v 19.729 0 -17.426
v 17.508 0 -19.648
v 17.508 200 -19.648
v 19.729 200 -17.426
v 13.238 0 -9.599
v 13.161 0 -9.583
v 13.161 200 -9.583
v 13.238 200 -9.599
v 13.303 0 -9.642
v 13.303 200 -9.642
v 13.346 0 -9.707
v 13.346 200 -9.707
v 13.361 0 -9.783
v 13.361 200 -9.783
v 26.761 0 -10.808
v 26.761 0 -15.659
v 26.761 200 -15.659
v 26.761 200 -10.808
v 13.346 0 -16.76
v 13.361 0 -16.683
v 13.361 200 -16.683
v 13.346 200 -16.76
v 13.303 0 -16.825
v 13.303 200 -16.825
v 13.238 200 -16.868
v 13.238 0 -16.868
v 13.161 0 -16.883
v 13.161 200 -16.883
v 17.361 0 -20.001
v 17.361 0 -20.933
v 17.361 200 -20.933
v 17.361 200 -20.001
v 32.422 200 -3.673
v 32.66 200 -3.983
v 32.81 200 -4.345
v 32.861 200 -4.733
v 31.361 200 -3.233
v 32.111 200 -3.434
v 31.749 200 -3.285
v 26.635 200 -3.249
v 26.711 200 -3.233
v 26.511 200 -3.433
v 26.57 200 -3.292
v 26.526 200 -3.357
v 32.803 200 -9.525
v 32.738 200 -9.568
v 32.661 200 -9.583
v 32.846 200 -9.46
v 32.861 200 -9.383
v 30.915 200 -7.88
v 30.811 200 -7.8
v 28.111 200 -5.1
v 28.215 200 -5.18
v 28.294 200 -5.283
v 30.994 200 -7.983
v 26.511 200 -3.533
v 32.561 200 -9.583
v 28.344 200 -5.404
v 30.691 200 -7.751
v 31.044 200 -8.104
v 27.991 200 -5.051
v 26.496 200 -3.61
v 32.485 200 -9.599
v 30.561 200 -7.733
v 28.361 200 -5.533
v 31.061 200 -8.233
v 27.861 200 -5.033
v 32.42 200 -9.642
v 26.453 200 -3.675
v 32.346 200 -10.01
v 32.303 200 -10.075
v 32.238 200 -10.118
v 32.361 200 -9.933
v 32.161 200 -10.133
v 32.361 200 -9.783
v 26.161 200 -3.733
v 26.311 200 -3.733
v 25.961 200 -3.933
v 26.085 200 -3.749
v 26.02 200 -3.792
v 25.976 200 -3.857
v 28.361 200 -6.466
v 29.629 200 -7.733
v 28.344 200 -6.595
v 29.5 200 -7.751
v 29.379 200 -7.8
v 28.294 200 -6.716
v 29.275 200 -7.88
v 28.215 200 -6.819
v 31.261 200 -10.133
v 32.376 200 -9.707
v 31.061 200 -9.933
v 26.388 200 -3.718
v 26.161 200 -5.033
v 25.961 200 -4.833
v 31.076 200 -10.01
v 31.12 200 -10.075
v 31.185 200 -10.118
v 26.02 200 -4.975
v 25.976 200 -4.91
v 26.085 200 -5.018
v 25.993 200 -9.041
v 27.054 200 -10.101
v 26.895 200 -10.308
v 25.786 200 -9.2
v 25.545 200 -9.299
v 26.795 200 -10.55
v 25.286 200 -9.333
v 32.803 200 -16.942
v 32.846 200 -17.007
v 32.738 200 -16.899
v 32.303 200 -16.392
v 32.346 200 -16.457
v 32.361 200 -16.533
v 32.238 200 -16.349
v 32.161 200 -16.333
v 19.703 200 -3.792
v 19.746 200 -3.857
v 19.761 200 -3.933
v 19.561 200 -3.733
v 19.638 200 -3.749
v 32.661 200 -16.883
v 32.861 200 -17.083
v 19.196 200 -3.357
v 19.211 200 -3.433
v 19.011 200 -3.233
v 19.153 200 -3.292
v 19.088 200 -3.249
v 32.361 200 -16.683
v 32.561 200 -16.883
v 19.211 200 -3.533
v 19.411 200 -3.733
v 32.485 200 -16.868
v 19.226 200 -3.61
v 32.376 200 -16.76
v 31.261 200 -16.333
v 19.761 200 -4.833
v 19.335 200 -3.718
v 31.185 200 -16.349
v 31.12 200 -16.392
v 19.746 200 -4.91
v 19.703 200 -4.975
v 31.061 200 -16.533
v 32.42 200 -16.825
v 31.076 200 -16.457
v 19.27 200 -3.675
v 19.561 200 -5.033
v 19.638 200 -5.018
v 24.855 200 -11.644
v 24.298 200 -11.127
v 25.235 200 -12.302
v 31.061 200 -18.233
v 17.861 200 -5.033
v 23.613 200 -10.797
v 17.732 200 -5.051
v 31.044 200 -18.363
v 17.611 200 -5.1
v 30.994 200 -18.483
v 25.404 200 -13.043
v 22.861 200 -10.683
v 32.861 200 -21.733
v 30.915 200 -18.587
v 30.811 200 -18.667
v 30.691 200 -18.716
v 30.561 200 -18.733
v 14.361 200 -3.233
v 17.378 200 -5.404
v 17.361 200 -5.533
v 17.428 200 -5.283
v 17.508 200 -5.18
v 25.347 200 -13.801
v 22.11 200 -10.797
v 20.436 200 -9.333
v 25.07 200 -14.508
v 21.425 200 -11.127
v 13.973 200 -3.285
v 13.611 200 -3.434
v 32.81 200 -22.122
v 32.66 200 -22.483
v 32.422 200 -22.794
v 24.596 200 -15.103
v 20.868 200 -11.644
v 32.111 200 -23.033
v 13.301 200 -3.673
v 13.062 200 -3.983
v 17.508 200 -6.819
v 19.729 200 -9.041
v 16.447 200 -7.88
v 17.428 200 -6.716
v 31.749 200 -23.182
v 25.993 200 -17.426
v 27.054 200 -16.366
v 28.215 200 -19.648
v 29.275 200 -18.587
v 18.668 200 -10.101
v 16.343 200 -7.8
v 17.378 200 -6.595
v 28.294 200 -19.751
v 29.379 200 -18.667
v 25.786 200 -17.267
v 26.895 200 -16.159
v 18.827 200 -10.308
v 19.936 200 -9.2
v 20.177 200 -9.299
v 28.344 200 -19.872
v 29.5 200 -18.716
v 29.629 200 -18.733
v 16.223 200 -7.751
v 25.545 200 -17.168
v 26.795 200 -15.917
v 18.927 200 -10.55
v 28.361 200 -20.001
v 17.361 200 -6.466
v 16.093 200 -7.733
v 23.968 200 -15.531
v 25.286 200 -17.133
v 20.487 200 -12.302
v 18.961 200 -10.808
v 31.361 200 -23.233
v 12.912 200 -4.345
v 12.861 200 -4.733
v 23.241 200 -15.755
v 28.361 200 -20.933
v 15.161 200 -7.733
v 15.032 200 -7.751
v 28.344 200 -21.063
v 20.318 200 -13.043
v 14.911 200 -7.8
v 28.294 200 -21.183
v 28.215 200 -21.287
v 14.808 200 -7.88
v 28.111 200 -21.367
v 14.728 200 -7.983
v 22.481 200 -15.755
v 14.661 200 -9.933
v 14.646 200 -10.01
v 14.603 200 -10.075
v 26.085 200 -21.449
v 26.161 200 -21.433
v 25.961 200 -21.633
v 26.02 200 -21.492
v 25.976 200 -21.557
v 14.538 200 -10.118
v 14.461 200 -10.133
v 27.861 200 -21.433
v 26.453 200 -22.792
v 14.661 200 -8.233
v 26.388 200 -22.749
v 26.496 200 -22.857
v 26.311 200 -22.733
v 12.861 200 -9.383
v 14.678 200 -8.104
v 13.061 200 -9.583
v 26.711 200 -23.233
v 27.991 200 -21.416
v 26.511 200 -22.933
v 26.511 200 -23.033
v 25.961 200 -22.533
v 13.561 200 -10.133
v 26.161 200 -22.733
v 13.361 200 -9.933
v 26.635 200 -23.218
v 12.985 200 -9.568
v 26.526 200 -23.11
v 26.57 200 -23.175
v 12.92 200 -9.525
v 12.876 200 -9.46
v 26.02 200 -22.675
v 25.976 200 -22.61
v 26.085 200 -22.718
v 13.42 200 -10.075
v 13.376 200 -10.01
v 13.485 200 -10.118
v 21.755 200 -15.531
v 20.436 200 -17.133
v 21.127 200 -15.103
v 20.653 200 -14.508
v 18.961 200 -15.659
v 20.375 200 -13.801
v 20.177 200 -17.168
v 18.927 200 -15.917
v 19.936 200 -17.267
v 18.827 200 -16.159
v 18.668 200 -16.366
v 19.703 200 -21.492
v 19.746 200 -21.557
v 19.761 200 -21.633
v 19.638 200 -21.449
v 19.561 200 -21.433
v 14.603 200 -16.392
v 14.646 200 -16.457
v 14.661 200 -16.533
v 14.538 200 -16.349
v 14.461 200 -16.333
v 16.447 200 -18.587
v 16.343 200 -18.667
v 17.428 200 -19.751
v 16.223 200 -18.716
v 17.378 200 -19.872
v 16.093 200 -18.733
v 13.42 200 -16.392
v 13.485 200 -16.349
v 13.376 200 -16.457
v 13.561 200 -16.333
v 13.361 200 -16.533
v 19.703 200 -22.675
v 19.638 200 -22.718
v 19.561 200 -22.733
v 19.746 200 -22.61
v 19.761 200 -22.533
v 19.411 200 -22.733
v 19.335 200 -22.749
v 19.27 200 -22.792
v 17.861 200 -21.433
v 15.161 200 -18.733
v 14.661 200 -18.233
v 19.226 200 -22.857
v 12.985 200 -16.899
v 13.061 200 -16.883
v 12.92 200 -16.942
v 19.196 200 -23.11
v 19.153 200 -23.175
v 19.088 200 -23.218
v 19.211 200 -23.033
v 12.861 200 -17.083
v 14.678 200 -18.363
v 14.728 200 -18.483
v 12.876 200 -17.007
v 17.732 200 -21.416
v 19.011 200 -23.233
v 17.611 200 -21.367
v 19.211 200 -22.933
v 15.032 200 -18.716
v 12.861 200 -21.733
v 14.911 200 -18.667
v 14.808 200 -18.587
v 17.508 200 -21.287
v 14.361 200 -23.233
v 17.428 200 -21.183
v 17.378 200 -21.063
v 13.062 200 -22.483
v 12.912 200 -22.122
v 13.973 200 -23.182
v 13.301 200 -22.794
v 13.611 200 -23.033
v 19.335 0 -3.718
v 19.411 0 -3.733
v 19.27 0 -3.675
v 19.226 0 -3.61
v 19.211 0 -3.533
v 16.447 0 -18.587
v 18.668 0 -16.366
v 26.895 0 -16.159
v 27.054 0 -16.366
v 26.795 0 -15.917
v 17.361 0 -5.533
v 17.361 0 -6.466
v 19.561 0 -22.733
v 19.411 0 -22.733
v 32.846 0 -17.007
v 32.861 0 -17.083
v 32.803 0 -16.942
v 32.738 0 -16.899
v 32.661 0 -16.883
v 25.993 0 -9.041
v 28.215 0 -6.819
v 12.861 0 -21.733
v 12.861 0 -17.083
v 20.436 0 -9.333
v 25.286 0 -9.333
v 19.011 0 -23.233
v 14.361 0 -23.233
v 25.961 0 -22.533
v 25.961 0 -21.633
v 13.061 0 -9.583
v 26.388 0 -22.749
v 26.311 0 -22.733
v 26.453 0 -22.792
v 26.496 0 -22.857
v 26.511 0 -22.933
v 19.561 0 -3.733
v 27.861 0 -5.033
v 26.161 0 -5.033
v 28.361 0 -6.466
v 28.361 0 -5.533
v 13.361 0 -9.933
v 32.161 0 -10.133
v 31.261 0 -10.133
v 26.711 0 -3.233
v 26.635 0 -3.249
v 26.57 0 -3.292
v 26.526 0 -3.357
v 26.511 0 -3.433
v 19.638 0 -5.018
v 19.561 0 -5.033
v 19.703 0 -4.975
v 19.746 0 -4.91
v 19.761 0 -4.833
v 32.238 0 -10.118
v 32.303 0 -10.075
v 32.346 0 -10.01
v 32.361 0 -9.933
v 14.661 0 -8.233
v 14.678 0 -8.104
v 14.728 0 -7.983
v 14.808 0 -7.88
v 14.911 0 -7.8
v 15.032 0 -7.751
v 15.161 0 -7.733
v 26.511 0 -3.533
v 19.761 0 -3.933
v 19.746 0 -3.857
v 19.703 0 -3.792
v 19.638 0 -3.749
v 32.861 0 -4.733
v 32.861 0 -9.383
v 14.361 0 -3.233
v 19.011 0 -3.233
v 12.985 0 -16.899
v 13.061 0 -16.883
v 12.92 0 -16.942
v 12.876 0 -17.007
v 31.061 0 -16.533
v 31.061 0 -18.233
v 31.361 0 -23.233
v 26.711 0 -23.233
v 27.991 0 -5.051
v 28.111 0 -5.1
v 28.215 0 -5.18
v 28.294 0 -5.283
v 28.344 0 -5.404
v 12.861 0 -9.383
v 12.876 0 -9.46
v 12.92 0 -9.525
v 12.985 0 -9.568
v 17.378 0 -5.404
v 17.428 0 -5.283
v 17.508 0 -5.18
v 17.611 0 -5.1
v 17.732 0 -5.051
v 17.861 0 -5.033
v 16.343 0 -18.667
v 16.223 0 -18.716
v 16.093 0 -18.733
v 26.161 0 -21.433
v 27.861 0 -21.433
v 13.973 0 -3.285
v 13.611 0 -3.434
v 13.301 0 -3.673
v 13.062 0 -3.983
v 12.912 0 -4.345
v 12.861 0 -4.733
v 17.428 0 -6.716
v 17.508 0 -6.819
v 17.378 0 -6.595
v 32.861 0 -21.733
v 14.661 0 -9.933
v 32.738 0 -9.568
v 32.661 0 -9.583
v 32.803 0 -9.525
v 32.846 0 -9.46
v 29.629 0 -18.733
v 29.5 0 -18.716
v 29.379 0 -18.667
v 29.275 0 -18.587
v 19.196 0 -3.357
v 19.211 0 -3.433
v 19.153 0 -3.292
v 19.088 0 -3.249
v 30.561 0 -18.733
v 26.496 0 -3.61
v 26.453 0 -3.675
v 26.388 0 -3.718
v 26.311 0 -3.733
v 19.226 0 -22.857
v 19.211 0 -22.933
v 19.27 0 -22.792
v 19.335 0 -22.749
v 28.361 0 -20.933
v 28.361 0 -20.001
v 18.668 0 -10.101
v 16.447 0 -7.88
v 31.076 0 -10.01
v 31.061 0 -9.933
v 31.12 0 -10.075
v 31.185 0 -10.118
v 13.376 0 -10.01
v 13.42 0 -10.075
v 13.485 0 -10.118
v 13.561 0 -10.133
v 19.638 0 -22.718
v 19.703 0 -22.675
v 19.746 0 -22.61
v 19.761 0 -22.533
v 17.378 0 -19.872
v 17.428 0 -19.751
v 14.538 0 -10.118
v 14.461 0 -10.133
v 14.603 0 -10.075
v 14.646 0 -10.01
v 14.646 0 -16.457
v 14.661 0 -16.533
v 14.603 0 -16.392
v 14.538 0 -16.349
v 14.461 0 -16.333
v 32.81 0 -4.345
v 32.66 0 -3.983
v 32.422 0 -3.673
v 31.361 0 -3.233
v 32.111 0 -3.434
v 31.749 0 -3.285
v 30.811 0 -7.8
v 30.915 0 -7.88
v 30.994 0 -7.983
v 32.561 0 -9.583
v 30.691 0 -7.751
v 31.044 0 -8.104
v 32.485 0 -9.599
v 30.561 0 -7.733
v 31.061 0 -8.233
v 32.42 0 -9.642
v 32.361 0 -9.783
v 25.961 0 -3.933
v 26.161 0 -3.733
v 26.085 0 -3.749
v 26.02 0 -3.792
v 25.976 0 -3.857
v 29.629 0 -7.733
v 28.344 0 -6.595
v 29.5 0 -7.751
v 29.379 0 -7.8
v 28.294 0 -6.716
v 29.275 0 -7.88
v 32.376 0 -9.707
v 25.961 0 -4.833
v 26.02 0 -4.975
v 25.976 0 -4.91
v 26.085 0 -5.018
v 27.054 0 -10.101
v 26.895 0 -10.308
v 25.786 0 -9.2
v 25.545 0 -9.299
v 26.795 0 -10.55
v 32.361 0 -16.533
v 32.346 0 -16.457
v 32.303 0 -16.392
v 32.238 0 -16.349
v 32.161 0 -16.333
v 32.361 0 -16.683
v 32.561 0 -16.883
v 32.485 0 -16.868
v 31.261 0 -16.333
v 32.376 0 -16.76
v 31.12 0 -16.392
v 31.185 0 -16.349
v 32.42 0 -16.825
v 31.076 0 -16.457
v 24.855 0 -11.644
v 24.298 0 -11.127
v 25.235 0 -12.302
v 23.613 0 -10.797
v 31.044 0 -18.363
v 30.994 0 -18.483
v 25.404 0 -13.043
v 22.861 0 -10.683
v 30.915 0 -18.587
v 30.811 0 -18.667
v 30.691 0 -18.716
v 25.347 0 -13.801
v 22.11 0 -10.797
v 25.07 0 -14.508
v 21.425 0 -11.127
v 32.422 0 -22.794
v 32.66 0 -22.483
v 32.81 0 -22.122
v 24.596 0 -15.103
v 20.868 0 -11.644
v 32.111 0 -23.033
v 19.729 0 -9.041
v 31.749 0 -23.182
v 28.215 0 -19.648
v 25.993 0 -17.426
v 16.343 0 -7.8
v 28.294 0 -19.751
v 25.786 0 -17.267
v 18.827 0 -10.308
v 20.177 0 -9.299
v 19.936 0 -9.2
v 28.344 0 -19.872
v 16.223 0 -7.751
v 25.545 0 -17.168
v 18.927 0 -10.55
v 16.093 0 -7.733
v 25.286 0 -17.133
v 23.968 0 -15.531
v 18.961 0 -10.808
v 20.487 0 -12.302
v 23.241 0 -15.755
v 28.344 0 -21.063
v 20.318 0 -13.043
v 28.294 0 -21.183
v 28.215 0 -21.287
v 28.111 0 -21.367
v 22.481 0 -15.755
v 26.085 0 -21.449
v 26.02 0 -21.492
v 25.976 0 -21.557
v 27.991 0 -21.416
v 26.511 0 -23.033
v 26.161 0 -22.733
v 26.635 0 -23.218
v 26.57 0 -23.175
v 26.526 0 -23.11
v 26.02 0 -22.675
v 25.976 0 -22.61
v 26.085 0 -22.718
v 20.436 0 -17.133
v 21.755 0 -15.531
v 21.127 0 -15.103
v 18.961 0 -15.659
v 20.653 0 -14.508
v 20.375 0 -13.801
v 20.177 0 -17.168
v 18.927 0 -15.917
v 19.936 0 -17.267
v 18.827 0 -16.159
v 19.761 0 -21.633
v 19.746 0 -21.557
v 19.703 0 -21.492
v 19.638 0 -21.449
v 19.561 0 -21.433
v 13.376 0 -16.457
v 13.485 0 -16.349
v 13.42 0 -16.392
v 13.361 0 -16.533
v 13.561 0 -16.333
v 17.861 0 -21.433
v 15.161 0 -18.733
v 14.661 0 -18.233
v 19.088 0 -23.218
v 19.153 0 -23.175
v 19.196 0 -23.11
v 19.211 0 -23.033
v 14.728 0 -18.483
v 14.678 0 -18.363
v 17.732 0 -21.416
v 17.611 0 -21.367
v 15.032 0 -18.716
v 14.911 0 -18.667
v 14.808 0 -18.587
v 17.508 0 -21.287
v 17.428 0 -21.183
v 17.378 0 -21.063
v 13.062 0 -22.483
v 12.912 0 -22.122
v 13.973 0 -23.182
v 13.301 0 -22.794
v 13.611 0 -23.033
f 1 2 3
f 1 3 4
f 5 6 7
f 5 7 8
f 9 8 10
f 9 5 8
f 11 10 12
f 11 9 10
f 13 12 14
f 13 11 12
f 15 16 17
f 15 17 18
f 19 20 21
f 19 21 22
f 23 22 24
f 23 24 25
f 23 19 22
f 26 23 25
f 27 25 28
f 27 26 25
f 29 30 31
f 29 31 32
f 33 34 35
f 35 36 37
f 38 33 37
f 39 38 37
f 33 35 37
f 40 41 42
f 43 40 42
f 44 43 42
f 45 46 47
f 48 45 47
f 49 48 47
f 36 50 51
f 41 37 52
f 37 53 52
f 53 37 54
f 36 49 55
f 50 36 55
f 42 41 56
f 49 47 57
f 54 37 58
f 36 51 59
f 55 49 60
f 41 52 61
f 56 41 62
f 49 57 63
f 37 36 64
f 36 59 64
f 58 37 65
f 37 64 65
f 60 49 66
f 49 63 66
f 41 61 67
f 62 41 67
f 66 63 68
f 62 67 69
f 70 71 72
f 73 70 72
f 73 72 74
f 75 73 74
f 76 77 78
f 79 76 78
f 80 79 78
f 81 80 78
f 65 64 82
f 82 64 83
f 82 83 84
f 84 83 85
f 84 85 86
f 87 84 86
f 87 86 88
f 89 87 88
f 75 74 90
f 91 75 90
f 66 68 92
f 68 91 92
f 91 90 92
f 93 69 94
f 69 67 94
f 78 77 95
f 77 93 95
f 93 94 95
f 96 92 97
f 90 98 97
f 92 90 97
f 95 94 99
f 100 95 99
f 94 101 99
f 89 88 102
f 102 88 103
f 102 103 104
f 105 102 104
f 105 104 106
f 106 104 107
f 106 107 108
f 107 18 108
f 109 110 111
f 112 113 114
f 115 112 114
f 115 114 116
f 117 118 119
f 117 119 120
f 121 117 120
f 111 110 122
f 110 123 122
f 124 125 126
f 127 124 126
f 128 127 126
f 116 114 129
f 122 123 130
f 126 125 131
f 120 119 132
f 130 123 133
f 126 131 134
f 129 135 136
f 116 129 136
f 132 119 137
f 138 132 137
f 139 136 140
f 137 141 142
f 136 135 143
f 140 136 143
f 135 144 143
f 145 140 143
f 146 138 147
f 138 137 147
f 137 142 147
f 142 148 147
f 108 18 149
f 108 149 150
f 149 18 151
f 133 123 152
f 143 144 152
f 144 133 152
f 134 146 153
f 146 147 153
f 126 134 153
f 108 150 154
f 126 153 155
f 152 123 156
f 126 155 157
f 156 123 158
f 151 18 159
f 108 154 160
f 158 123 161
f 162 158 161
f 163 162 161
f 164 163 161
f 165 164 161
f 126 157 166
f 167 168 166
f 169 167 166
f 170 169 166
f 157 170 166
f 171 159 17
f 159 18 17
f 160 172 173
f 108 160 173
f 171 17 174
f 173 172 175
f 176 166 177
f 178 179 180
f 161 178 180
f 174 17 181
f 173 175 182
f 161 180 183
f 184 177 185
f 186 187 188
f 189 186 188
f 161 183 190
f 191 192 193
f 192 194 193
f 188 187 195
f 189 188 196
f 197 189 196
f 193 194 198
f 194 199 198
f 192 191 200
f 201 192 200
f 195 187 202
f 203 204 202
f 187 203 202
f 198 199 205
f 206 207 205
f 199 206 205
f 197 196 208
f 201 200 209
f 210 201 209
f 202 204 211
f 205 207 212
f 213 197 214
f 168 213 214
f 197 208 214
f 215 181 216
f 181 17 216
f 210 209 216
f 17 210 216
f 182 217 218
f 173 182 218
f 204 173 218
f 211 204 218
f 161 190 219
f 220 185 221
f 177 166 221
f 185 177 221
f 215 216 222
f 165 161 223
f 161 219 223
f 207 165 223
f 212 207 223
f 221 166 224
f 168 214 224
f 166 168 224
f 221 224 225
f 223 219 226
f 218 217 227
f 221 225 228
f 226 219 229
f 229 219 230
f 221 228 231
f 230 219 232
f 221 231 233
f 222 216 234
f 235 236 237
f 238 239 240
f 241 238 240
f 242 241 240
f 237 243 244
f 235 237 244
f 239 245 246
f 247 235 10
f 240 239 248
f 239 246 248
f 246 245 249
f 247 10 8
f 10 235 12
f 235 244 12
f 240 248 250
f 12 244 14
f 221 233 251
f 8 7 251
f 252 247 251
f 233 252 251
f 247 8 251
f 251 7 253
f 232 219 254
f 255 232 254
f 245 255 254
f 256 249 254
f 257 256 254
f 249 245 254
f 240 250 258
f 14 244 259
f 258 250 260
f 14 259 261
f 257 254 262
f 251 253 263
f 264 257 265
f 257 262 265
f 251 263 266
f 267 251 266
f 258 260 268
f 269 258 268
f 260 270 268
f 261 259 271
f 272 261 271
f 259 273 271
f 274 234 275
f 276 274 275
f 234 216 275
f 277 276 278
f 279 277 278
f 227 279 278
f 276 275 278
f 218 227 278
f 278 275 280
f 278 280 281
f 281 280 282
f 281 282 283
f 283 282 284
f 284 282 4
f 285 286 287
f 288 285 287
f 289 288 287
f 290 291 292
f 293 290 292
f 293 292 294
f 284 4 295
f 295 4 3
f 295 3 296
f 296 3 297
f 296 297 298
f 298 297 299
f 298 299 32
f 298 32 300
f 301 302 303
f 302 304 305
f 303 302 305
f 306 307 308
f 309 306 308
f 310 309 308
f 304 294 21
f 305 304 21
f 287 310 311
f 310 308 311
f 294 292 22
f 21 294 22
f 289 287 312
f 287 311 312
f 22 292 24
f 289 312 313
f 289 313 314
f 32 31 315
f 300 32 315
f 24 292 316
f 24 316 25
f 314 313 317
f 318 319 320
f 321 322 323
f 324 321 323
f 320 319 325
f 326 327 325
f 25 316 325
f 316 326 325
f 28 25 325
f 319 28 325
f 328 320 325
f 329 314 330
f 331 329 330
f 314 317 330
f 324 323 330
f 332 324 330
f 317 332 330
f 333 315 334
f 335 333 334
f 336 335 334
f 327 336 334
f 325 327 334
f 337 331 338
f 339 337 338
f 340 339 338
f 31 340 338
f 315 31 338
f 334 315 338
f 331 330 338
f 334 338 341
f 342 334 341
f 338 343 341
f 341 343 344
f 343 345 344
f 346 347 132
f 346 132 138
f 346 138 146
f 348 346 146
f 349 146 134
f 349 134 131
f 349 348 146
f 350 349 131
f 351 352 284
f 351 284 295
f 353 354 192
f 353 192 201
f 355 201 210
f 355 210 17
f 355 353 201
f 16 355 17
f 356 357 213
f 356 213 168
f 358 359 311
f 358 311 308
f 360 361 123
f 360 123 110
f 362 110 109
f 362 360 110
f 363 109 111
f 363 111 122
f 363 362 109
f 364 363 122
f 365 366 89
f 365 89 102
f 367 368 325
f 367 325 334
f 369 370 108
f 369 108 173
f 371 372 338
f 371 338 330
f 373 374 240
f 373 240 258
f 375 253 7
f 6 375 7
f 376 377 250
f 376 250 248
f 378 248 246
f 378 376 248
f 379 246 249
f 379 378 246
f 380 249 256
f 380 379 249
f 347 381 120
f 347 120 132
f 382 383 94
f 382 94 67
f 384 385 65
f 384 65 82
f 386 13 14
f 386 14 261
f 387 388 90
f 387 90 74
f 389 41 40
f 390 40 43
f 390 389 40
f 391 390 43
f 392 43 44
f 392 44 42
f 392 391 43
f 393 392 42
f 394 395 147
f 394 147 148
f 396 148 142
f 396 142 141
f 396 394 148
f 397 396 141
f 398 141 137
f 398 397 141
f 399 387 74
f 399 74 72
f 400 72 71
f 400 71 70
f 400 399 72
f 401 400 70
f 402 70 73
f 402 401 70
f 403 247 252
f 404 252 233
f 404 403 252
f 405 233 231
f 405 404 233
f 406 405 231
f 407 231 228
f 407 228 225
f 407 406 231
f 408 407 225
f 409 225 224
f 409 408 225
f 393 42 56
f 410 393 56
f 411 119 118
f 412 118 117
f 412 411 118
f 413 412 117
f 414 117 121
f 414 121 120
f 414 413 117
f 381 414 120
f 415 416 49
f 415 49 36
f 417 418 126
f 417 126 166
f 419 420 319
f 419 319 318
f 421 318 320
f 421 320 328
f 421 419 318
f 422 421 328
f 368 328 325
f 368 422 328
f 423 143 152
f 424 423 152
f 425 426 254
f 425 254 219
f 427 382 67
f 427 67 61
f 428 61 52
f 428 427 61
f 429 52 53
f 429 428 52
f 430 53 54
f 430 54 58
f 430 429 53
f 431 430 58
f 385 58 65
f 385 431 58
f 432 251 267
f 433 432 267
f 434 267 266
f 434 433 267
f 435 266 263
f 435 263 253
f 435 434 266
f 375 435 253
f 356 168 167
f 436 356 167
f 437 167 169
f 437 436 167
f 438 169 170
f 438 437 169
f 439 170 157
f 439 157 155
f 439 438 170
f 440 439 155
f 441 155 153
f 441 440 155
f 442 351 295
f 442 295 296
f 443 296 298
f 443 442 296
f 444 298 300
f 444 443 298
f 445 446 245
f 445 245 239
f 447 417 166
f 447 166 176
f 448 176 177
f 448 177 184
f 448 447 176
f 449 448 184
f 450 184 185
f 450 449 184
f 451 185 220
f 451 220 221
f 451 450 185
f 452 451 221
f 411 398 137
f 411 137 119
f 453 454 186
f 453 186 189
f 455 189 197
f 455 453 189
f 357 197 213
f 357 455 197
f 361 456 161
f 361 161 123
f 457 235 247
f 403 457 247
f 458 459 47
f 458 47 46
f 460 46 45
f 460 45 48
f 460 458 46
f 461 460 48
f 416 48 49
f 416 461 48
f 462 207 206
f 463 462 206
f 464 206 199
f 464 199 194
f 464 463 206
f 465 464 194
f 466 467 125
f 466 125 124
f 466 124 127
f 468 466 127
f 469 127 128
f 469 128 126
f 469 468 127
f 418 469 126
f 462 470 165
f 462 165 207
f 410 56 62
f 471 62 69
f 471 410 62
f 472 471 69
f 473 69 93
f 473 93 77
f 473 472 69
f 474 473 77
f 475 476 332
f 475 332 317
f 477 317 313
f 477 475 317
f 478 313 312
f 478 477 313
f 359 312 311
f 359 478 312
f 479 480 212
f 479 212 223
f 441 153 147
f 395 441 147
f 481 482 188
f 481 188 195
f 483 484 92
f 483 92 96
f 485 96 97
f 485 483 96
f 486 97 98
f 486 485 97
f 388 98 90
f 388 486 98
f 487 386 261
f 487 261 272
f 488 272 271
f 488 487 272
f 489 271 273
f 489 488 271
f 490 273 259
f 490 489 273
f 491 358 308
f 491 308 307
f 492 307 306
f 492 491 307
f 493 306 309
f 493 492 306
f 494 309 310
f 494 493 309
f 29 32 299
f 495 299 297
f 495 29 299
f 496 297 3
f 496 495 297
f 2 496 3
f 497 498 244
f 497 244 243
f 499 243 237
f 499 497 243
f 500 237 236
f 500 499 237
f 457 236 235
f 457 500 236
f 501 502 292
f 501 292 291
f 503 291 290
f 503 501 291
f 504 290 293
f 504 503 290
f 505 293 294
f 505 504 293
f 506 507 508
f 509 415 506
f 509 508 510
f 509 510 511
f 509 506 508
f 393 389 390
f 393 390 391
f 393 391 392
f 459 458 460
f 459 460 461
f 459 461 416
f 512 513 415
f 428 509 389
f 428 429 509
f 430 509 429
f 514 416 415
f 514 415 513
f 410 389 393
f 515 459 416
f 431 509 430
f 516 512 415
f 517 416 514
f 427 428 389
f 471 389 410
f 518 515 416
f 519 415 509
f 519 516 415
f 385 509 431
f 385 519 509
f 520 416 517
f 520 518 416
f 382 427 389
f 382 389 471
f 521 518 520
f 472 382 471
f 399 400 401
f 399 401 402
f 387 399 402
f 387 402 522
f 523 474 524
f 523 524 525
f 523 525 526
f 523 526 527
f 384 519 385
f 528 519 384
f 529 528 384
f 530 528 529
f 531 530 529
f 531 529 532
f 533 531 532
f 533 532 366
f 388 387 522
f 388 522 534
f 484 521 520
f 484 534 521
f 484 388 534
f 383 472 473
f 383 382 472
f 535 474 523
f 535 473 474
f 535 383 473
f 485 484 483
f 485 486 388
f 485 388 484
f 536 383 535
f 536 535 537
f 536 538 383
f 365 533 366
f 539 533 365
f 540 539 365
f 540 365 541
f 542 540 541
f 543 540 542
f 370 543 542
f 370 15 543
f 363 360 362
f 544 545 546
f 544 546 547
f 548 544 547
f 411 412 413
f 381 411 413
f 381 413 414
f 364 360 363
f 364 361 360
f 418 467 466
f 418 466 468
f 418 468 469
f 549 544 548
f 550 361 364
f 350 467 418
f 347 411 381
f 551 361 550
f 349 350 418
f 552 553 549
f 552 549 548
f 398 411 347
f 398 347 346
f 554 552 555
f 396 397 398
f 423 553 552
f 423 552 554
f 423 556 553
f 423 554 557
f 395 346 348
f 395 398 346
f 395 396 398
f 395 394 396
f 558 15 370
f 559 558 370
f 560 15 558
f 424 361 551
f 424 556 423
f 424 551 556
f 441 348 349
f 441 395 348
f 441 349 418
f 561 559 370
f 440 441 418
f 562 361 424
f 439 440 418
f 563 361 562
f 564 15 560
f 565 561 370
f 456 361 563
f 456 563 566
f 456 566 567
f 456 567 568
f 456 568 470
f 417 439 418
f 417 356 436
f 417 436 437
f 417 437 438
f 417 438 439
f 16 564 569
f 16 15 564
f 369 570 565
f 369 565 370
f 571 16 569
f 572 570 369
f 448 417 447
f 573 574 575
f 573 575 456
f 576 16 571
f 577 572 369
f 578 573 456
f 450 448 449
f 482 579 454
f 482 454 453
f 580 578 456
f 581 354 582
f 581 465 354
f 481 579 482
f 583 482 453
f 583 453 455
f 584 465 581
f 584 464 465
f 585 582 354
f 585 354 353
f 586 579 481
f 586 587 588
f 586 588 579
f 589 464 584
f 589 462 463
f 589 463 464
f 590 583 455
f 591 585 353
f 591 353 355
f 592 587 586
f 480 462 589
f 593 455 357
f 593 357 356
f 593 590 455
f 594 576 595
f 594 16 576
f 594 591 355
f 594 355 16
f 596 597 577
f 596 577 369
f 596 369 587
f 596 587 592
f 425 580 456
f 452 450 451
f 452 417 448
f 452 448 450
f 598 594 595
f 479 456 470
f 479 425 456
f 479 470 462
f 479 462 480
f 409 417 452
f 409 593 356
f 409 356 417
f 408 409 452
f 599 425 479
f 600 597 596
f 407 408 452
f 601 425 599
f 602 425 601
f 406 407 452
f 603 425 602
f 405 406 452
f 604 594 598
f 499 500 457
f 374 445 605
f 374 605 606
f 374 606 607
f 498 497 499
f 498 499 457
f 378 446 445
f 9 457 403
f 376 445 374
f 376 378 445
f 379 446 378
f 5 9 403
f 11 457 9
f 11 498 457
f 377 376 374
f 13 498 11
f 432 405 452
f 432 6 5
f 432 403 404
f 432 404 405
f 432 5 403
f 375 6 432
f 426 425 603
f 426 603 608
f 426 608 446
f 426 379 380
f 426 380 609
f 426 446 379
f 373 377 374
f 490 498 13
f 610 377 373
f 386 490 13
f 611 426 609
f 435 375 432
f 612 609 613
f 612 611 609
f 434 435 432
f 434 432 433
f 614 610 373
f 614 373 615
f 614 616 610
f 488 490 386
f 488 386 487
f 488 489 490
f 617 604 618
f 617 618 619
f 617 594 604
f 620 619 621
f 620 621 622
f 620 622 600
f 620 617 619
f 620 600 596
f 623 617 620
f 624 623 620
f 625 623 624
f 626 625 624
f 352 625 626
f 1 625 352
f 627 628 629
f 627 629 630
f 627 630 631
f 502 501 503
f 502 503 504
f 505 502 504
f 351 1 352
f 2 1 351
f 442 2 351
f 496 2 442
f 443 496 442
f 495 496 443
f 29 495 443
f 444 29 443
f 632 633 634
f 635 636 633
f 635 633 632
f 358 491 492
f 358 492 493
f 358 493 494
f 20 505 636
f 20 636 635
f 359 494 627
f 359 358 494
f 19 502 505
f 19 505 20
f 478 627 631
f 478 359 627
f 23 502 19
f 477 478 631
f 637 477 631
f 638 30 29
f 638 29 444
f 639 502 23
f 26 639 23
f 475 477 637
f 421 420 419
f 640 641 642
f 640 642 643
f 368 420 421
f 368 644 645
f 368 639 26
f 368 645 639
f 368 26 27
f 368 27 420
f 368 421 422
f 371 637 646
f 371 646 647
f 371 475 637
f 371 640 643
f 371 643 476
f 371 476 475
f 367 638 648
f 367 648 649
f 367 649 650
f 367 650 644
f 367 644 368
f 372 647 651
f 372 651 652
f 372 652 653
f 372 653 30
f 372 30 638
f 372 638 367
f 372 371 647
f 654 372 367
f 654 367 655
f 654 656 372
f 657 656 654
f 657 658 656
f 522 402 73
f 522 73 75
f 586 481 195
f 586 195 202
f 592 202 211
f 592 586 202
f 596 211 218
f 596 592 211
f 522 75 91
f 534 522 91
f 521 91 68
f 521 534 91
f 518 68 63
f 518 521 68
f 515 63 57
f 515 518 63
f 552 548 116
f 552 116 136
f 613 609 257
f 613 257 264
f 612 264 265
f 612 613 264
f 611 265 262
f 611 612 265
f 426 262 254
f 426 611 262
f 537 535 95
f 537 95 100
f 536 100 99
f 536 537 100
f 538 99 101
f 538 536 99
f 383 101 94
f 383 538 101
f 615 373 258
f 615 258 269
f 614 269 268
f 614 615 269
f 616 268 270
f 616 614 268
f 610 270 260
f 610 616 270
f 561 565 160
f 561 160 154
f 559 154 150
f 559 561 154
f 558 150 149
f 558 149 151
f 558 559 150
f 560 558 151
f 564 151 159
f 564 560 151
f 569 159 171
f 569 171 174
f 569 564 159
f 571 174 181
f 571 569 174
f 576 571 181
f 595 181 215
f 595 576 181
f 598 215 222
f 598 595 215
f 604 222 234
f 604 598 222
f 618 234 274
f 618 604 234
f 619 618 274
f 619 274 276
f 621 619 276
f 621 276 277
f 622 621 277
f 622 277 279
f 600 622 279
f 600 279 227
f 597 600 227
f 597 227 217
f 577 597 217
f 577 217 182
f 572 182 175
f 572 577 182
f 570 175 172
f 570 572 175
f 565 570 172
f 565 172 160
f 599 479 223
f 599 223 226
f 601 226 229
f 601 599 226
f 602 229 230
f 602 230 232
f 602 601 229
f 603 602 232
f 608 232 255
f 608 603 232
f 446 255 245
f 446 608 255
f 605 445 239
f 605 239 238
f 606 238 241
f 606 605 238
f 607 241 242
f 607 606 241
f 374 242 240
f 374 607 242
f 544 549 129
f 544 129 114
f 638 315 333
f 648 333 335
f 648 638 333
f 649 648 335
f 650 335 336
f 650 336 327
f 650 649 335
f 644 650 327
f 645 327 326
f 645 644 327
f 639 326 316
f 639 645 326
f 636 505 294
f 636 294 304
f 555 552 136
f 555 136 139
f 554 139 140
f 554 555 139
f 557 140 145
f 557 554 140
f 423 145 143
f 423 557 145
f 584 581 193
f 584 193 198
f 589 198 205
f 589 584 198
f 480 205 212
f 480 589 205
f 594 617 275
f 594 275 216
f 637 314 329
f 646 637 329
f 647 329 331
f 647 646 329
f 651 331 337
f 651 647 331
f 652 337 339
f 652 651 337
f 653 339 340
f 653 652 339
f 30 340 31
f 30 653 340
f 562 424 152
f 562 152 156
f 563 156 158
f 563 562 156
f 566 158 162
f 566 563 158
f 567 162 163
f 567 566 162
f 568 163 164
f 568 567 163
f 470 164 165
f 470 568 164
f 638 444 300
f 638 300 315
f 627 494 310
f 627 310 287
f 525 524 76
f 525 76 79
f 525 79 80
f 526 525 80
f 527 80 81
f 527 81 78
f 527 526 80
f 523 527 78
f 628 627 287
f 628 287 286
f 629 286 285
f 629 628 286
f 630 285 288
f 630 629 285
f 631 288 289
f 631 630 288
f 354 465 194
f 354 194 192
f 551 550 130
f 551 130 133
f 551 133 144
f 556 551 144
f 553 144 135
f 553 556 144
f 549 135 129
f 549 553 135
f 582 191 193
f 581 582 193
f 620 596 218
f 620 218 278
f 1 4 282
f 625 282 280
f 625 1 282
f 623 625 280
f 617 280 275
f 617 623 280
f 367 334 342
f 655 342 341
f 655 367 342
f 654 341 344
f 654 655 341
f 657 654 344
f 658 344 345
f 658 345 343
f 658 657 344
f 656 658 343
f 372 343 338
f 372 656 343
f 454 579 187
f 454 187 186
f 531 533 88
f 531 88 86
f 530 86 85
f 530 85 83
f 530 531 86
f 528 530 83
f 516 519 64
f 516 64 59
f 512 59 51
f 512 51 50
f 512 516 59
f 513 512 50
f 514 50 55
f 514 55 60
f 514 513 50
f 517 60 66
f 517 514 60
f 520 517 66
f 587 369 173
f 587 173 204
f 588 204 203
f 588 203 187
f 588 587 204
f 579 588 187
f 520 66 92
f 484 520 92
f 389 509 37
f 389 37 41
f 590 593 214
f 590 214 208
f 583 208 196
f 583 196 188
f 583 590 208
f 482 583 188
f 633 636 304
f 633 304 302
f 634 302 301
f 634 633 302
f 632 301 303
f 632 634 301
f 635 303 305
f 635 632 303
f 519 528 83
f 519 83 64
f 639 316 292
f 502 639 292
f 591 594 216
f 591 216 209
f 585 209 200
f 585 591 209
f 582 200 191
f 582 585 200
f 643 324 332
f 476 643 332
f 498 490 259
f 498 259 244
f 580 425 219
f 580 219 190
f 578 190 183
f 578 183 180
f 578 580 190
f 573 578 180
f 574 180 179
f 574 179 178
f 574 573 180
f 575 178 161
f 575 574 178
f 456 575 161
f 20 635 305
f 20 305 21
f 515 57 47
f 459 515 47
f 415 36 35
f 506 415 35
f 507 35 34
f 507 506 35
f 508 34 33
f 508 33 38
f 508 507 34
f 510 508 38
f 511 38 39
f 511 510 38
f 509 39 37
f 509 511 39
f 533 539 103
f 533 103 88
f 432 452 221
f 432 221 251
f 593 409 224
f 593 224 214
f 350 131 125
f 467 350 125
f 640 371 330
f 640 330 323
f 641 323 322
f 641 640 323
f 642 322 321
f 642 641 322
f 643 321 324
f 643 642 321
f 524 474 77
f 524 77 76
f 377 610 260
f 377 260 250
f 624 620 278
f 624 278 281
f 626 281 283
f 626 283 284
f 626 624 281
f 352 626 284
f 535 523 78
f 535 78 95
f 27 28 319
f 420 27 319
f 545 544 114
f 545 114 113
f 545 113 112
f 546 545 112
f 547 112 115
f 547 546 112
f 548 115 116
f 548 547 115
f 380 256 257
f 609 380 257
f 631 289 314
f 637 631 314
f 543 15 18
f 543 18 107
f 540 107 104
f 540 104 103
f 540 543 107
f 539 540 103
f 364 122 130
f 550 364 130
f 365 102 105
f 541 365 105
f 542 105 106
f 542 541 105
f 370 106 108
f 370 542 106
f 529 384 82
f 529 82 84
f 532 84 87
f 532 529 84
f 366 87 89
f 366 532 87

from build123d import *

# Parameters (mm, degrees)
SKETCH_1_R      = 2.55
EXTRUDE_1_DEPTH = 200


with BuildPart() as part:
    # 草图1 → 凸台-拉伸1 (new body)
    with BuildSketch(Plane(origin=(0, 0, 0), x_dir=(1, 0, 0), z_dir=(0, 1, 0))):
        with BuildLine():
            Line((19.761209246, 22.533499136), (19.761209246, 21.633499136))
            ThreePointArc((19.761209246, 21.633499136), (19.702630602, 21.49207778), (19.561209246, 21.433499136))
            Line((19.561209246, 21.433499136), (17.861209246, 21.433499136))
            ThreePointArc((17.861209246, 21.433499136), (17.507655855, 21.287052526), (17.361209246, 20.933499136))
            Line((17.361209246, 20.933499136), (17.361209246, 20.001266089))
            ThreePointArc((17.361209246, 20.001266089), (17.39926948, 19.809924373), (17.507655855, 19.647712698))
            Line((17.507655855, 19.647712698), (19.728976199, 17.426392355))
            ThreePointArc((19.728976199, 17.426392355), (20.053399548, 17.209619603), (20.43608298, 17.133499136))
            Line((20.43608298, 17.133499136), (25.286335512, 17.133499136))
            ThreePointArc((25.286335512, 17.133499136), (25.669018944, 17.209619603), (25.993442293, 17.426392355))
            Line((25.993442293, 17.426392355), (28.214762636, 19.647712698))
            ThreePointArc((28.214762636, 19.647712698), (28.323149012, 19.809924373), (28.361209246, 20.001266089))
            Line((28.361209246, 20.001266089), (28.361209246, 20.933499136))
            ThreePointArc((28.361209246, 20.933499136), (28.214762636, 21.287052526), (27.861209246, 21.433499136))
            Line((27.861209246, 21.433499136), (26.161209246, 21.433499136))
            ThreePointArc((26.161209246, 21.433499136), (26.01978789, 21.49207778), (25.961209246, 21.633499136))
            Line((25.961209246, 21.633499136), (25.961209246, 22.533499136))
            ThreePointArc((25.961209246, 22.533499136), (26.01978789, 22.674920492), (26.161209246, 22.733499136))
            Line((26.161209246, 22.733499136), (26.311209246, 22.733499136))
            ThreePointArc((26.311209246, 22.733499136), (26.452630602, 22.79207778), (26.511209246, 22.933499136))
            Line((26.511209246, 22.933499136), (26.511209246, 23.033499136))
            ThreePointArc((26.511209246, 23.033499136), (26.56978789, 23.174920492), (26.711209246, 23.233499136))
            Line((26.711209246, 23.233499136), (31.361209246, 23.233499136))
            ThreePointArc((31.361209246, 23.233499136), (32.421869418, 22.794159308), (32.861209246, 21.733499136))
            Line((32.861209246, 21.733499136), (32.861209246, 17.083499136))
            ThreePointArc((32.861209246, 17.083499136), (32.802630602, 16.94207778), (32.661209246, 16.883499136))
            Line((32.661209246, 16.883499136), (32.561209246, 16.883499136))
            ThreePointArc((32.561209246, 16.883499136), (32.41978789, 16.824920492), (32.361209246, 16.683499136))
            Line((32.361209246, 16.683499136), (32.361209246, 16.533499136))
            ThreePointArc((32.361209246, 16.533499136), (32.302630602, 16.39207778), (32.161209246, 16.333499136))
            Line((32.161209246, 16.333499136), (31.261209246, 16.333499136))
            ThreePointArc((31.261209246, 16.333499136), (31.11978789, 16.39207778), (31.061209246, 16.533499136))
            Line((31.061209246, 16.533499136), (31.061209246, 18.233499136))
            ThreePointArc((31.061209246, 18.233499136), (30.914762636, 18.587052526), (30.561209246, 18.733499136))
            Line((30.561209246, 18.733499136), (29.628976199, 18.733499136))
            ThreePointArc((29.628976199, 18.733499136), (29.437634483, 18.695438902), (29.275422808, 18.587052526))
            Line((29.275422808, 18.587052526), (27.054102465, 16.365732183))
            ThreePointArc((27.054102465, 16.365732183), (26.837329713, 16.041308834), (26.761209246, 15.658625402))
            Line((26.761209246, 15.658625402), (26.761209246, 10.80837287))
            ThreePointArc((26.761209246, 10.80837287), (26.837329713, 10.425689438), (27.054102465, 10.101266089))
            Line((27.054102465, 10.101266089), (29.275422808, 7.879945745))
            ThreePointArc((29.275422808, 7.879945745), (29.437634483, 7.77155937), (29.628976199, 7.733499136))
            Line((29.628976199, 7.733499136), (30.561209246, 7.733499136))
            ThreePointArc((30.561209246, 7.733499136), (30.914762636, 7.879945745), (31.061209246, 8.233499136))
            Line((31.061209246, 8.233499136), (31.061209246, 9.933499136))
            ThreePointArc((31.061209246, 9.933499136), (31.11978789, 10.074920492), (31.261209246, 10.133499136))
            Line((31.261209246, 10.133499136), (32.161209246, 10.133499136))
            ThreePointArc((32.161209246, 10.133499136), (32.302630602, 10.074920492), (32.361209246, 9.933499136))
            Line((32.361209246, 9.933499136), (32.361209246, 9.783499136))
            ThreePointArc((32.361209246, 9.783499136), (32.41978789, 9.64207778), (32.561209246, 9.583499136))
            Line((32.561209246, 9.583499136), (32.661209246, 9.583499136))
            ThreePointArc((32.661209246, 9.583499136), (32.802630602, 9.524920492), (32.861209246, 9.383499136))
            Line((32.861209246, 9.383499136), (32.861209246, 4.733499136))
            ThreePointArc((32.861209246, 4.733499136), (32.421869418, 3.672838964), (31.361209246, 3.233499136))
            Line((31.361209246, 3.233499136), (26.711209246, 3.233499136))
            ThreePointArc((26.711209246, 3.233499136), (26.56978789, 3.29207778), (26.511209246, 3.433499136))
            Line((26.511209246, 3.433499136), (26.511209246, 3.533499136))
            ThreePointArc((26.511209246, 3.533499136), (26.452630602, 3.674920492), (26.311209246, 3.733499136))
            Line((26.311209246, 3.733499136), (26.161209246, 3.733499136))
            ThreePointArc((26.161209246, 3.733499136), (26.01978789, 3.79207778), (25.961209246, 3.933499136))
            Line((25.961209246, 3.933499136), (25.961209246, 4.833499136))
            ThreePointArc((25.961209246, 4.833499136), (26.01978789, 4.974920492), (26.161209246, 5.033499136))
            Line((26.161209246, 5.033499136), (27.861209246, 5.033499136))
            ThreePointArc((27.861209246, 5.033499136), (28.214762636, 5.179945745), (28.361209246, 5.533499136))
            Line((28.361209246, 5.533499136), (28.361209246, 6.465732183))
            ThreePointArc((28.361209246, 6.465732183), (28.323149012, 6.657073899), (28.214762636, 6.819285573))
            Line((28.214762636, 6.819285573), (25.993442293, 9.040605917))
            ThreePointArc((25.993442293, 9.040605917), (25.669018944, 9.257378668), (25.286335512, 9.333499136))
            Line((25.286335512, 9.333499136), (20.43608298, 9.333499136))
            ThreePointArc((20.43608298, 9.333499136), (20.053399548, 9.257378668), (19.728976199, 9.040605917))
            Line((19.728976199, 9.040605917), (17.507655855, 6.819285573))
            ThreePointArc((17.507655855, 6.819285573), (17.39926948, 6.657073899), (17.361209246, 6.465732183))
            Line((17.361209246, 6.465732183), (17.361209246, 5.533499136))
            ThreePointArc((17.361209246, 5.533499136), (17.507655855, 5.179945745), (17.861209246, 5.033499136))
            Line((17.861209246, 5.033499136), (19.561209246, 5.033499136))
            ThreePointArc((19.561209246, 5.033499136), (19.702630602, 4.974920492), (19.761209246, 4.833499136))
            Line((19.761209246, 4.833499136), (19.761209246, 3.933499136))
            ThreePointArc((19.761209246, 3.933499136), (19.702630602, 3.79207778), (19.561209246, 3.733499136))
            Line((19.561209246, 3.733499136), (19.411209246, 3.733499136))
            ThreePointArc((19.411209246, 3.733499136), (19.26978789, 3.674920492), (19.211209246, 3.533499136))
            Line((19.211209246, 3.533499136), (19.211209246, 3.433499136))
            ThreePointArc((19.211209246, 3.433499136), (19.152630602, 3.29207778), (19.011209246, 3.233499136))
            Line((19.011209246, 3.233499136), (14.361209246, 3.233499136))
            ThreePointArc((14.361209246, 3.233499136), (13.300549074, 3.672838964), (12.861209246, 4.733499136))
            Line((12.861209246, 4.733499136), (12.861209246, 9.383499136))
            ThreePointArc((12.861209246, 9.383499136), (12.91978789, 9.524920492), (13.061209246, 9.583499136))
            Line((13.061209246, 9.583499136), (13.161209246, 9.583499136))
            ThreePointArc((13.161209246, 9.583499136), (13.302630602, 9.64207778), (13.361209246, 9.783499136))
            Line((13.361209246, 9.783499136), (13.361209246, 9.933499136))
            ThreePointArc((13.361209246, 9.933499136), (13.41978789, 10.074920492), (13.561209246, 10.133499136))
            Line((13.561209246, 10.133499136), (14.461209246, 10.133499136))
            ThreePointArc((14.461209246, 10.133499136), (14.602630602, 10.074920492), (14.661209246, 9.933499136))
            Line((14.661209246, 9.933499136), (14.661209246, 8.233499136))
            ThreePointArc((14.661209246, 8.233499136), (14.807655855, 7.879945745), (15.161209246, 7.733499136))
            Line((15.161209246, 7.733499136), (16.093442293, 7.733499136))
            ThreePointArc((16.093442293, 7.733499136), (16.284784009, 7.77155937), (16.446995684, 7.879945745))
            Line((16.446995684, 7.879945745), (18.668316027, 10.101266089))
            ThreePointArc((18.668316027, 10.101266089), (18.885088778, 10.425689438), (18.961209246, 10.80837287))
            Line((18.961209246, 10.80837287), (18.961209246, 13.233499136))
            Line((18.961209246, 13.233499136), (18.961209246, 15.658625402))
            ThreePointArc((18.961209246, 15.658625402), (18.885088778, 16.041308834), (18.668316027, 16.365732183))
            Line((18.668316027, 16.365732183), (16.446995684, 18.587052526))
            ThreePointArc((16.446995684, 18.587052526), (16.284784009, 18.695438902), (16.093442293, 18.733499136))
            Line((16.093442293, 18.733499136), (15.161209246, 18.733499136))
            ThreePointArc((15.161209246, 18.733499136), (14.807655855, 18.587052526), (14.661209246, 18.233499136))
            Line((14.661209246, 18.233499136), (14.661209246, 16.533499136))
            ThreePointArc((14.661209246, 16.533499136), (14.602630602, 16.39207778), (14.461209246, 16.333499136))
            Line((14.461209246, 16.333499136), (13.561209246, 16.333499136))
            ThreePointArc((13.561209246, 16.333499136), (13.41978789, 16.39207778), (13.361209246, 16.533499136))
            Line((13.361209246, 16.533499136), (13.361209246, 16.683499136))
            ThreePointArc((13.361209246, 16.683499136), (13.302630602, 16.824920492), (13.161209246, 16.883499136))
            Line((13.161209246, 16.883499136), (13.061209246, 16.883499136))
            ThreePointArc((13.061209246, 16.883499136), (12.91978789, 16.94207778), (12.861209246, 17.083499136))
            Line((12.861209246, 17.083499136), (12.861209246, 21.733499136))
            ThreePointArc((12.861209246, 21.733499136), (13.300549074, 22.794159308), (14.361209246, 23.233499136))
            Line((14.361209246, 23.233499136), (19.011209246, 23.233499136))
            ThreePointArc((19.011209246, 23.233499136), (19.152630602, 23.174920492), (19.211209246, 23.033499136))
            Line((19.211209246, 23.033499136), (19.211209246, 22.933499136))
            ThreePointArc((19.211209246, 22.933499136), (19.26978789, 22.79207778), (19.411209246, 22.733499136))
            Line((19.411209246, 22.733499136), (19.561209246, 22.733499136))
            ThreePointArc((19.561209246, 22.733499136), (19.702630602, 22.674920492), (19.761209246, 22.533499136))
        make_face()
        with Locations(Location((22.861209246, 13.233499136, 0), (0, 0, 270))):
            Circle(SKETCH_1_R, mode=Mode.SUBTRACT)
    extrude(amount=EXTRUDE_1_DEPTH)


solid = part.part
